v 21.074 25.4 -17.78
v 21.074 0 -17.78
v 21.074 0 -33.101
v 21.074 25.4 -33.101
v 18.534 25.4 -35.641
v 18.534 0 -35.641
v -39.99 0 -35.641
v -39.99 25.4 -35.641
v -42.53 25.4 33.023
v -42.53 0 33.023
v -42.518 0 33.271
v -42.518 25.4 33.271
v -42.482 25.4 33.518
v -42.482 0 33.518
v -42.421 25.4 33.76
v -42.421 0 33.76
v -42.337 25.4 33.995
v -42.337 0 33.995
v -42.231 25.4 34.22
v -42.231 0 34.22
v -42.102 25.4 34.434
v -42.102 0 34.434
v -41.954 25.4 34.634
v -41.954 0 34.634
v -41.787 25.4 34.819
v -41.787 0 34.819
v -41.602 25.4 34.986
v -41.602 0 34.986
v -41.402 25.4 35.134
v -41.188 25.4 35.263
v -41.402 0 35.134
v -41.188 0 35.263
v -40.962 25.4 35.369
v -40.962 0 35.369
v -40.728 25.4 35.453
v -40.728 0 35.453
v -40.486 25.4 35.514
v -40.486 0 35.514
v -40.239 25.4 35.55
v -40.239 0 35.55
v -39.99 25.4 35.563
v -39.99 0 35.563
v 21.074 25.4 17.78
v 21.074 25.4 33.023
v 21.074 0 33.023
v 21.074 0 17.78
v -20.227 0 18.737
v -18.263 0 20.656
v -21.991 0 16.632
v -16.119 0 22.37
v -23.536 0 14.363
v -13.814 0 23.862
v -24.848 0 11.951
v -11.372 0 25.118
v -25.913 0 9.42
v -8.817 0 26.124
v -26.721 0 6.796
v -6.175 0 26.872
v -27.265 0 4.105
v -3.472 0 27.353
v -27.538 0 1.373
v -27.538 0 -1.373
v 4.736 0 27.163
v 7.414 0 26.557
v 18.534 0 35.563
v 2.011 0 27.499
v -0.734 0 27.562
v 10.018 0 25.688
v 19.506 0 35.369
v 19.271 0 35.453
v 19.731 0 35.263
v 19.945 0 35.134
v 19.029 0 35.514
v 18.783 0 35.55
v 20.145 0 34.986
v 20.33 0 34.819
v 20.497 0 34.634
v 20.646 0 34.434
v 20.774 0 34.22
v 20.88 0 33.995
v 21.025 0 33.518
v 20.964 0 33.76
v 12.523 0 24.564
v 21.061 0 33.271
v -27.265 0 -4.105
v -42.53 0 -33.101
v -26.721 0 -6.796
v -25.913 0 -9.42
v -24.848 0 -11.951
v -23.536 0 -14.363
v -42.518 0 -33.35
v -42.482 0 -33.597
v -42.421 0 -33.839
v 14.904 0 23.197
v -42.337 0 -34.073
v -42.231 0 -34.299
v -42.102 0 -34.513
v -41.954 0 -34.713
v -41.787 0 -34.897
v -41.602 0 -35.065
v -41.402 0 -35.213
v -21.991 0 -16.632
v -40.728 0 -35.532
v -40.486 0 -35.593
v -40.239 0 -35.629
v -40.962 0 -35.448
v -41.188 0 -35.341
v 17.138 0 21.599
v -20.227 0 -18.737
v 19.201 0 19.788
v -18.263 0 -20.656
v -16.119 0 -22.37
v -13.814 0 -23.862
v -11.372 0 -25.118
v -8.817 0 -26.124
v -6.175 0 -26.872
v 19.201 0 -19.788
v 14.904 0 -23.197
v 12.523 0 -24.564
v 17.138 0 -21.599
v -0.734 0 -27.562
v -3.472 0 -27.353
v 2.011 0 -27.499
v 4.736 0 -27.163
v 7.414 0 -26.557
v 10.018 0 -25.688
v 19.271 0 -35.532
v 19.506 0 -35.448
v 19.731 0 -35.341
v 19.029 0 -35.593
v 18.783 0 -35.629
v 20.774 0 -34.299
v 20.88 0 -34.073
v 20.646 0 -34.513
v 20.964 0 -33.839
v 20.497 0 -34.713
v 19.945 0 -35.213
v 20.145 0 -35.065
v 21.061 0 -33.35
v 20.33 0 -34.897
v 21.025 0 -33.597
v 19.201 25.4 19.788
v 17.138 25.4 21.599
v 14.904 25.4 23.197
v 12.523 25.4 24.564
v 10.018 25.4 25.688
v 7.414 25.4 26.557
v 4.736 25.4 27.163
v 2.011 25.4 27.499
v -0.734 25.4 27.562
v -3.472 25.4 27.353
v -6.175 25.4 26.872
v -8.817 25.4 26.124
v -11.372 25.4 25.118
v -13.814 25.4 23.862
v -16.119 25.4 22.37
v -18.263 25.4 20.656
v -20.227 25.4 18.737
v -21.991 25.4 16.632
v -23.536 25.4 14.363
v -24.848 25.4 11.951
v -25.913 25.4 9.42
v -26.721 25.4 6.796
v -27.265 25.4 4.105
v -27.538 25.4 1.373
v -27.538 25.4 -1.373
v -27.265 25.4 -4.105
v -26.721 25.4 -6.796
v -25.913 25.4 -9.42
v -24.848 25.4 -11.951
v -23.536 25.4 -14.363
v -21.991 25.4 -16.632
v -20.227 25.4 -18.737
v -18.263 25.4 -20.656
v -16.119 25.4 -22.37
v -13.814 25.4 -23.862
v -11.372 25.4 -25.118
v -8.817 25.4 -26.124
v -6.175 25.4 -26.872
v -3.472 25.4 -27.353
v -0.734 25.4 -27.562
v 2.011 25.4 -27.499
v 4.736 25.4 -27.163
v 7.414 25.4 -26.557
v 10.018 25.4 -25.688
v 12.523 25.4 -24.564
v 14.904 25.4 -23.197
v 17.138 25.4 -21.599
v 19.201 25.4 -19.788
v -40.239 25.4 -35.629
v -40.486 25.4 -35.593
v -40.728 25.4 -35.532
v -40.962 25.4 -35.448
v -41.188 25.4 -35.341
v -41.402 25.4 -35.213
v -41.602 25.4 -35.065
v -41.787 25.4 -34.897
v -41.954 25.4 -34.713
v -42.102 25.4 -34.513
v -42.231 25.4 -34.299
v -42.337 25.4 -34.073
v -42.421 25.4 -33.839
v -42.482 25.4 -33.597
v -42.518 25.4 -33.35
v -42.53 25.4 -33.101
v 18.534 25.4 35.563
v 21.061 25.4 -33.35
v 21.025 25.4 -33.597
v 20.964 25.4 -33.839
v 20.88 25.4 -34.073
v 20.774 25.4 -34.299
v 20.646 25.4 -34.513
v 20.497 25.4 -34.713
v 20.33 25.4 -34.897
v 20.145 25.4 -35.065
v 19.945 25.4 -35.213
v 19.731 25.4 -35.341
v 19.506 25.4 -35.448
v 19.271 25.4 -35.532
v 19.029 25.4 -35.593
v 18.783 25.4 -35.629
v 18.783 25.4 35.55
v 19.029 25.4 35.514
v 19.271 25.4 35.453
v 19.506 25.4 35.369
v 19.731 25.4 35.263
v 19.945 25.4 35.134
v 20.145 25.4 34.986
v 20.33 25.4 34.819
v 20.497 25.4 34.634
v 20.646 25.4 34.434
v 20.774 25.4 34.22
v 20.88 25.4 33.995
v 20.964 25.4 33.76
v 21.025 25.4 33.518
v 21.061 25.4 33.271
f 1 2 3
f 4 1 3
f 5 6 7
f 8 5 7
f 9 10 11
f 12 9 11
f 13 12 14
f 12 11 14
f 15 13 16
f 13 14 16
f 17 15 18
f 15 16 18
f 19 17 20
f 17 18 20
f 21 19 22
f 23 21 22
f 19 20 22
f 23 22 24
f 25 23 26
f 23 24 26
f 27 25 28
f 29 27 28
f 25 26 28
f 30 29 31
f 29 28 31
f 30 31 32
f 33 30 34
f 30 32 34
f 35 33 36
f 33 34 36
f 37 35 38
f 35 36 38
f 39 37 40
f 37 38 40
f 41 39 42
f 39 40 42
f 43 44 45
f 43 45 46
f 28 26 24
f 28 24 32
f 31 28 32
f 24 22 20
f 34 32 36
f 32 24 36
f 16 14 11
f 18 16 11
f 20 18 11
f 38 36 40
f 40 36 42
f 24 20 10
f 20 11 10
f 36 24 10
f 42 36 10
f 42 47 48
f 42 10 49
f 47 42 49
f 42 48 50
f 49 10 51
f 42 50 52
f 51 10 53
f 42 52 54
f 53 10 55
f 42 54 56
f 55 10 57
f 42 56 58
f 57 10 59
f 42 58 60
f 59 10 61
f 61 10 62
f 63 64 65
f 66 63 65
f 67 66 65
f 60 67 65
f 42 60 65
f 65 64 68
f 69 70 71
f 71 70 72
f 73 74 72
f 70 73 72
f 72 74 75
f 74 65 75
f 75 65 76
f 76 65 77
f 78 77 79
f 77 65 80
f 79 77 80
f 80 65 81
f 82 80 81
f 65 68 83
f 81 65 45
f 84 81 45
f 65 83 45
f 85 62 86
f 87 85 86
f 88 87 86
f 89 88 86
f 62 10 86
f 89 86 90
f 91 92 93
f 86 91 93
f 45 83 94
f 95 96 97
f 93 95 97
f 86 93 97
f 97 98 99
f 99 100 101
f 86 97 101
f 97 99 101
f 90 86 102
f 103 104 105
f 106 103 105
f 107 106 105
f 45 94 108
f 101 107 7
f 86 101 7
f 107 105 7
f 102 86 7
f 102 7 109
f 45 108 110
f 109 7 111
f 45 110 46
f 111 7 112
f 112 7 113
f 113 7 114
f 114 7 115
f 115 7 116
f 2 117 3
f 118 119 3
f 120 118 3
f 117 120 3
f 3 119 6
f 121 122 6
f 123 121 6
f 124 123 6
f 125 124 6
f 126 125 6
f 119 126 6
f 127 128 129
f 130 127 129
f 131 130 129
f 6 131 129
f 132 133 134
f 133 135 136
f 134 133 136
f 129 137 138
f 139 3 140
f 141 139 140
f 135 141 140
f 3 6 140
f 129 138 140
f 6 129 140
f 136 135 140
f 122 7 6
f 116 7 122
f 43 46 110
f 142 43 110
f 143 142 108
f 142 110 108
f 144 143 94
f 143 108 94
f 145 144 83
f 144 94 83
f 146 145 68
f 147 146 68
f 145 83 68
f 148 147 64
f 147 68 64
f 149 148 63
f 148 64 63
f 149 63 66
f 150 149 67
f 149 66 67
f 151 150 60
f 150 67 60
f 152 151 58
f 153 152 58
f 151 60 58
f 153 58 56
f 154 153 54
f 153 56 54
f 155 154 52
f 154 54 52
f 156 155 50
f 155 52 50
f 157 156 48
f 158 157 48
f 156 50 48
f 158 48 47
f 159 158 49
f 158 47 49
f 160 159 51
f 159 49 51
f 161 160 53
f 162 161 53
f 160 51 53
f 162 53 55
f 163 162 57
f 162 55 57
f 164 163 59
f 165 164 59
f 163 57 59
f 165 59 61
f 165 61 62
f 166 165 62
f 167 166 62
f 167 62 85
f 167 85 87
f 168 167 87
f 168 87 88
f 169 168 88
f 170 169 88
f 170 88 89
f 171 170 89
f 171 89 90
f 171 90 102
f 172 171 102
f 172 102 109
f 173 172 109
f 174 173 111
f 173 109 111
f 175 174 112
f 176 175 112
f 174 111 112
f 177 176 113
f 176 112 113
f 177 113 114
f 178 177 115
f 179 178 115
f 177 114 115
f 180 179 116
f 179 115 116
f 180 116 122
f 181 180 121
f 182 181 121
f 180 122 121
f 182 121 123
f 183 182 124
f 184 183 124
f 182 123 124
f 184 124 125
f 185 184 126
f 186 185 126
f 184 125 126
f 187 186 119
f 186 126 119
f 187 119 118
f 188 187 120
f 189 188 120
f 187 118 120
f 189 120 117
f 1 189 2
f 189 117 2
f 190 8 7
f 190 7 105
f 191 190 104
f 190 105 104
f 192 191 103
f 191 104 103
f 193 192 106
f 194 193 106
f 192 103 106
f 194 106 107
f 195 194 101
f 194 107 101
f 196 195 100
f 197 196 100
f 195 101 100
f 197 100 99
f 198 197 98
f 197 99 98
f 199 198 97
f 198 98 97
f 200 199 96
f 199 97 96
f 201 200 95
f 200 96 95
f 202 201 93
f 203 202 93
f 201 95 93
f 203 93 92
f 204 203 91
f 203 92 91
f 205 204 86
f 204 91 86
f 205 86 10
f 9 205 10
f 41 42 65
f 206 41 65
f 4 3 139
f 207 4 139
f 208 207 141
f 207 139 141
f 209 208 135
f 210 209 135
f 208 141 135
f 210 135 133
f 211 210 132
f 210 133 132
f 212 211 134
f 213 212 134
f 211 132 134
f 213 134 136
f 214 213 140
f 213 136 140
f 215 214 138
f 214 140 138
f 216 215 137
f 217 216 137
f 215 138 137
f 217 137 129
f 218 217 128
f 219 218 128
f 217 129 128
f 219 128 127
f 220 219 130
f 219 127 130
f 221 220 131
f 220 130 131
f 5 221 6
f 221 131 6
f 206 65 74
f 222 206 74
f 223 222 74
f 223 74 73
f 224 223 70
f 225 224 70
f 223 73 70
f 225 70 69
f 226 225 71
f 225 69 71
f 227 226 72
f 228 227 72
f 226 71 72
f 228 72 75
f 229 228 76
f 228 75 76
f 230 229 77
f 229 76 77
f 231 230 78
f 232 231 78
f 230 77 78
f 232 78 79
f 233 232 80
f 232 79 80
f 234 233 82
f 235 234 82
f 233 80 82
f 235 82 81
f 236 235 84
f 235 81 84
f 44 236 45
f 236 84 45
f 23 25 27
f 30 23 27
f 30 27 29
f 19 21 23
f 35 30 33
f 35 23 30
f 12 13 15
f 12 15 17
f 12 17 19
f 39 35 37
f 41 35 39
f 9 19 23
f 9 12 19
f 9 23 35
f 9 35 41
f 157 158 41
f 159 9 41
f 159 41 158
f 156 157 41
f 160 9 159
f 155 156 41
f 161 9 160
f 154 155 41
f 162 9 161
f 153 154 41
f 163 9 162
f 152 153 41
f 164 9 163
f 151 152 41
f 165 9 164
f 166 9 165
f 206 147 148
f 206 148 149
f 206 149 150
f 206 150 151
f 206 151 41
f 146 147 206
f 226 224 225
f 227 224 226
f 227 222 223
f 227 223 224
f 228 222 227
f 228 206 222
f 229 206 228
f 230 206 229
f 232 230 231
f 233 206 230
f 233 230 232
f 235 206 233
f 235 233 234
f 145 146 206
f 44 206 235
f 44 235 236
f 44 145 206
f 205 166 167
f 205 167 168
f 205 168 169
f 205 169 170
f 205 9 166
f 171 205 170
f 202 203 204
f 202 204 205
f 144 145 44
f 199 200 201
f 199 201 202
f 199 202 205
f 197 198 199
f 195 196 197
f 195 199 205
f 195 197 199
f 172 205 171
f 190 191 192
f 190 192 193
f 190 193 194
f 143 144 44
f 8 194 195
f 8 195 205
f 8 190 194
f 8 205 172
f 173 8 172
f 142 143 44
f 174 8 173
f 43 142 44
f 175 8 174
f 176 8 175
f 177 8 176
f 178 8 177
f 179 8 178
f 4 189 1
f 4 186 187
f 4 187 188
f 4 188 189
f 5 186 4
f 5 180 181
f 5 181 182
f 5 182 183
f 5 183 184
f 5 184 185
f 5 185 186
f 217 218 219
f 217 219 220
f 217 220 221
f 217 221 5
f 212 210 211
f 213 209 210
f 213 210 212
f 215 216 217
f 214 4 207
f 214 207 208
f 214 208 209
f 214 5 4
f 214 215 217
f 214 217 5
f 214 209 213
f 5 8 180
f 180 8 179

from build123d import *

# Parameters (mm, degrees)
BOSS_EXTRUDE1_DEPTH = 25.4


with BuildPart() as part:
    # Sketch1 → Boss-Extrude1 (new body)
    with BuildSketch(Plane(origin=(0, 0, 0), x_dir=(1, 0, 0), z_dir=(0, 1, 0))):
        with BuildLine():
            Line((18.533658611, 35.641367486), (-39.99048208, 35.641367486))
            ThreePointArc((-39.99048208, 35.641367486), (-41.786533304, 34.89741871), (-42.53048208, 33.101367486))
            Line((-42.53048208, 33.101367486), (-42.53048208, -33.022533273))
            ThreePointArc((-42.53048208, -33.022533273), (-41.786533304, -34.818584498), (-39.99048208, -35.562533273))
            Line((-39.99048208, -35.562533273), (18.533658611, -35.562533273))
            ThreePointArc((18.533658611, -35.562533273), (20.329709835, -34.818584498), (21.073658611, -33.022533273))
            Line((21.073658611, -33.022533273), (21.073658611, -17.78))
            ThreePointArc((21.073658611, -17.78), (-27.572223111, 0), (21.073658611, 17.78))
            Line((21.073658611, 17.78), (21.073658611, 33.101367486))
            ThreePointArc((21.073658611, 33.101367486), (20.329709835, 34.89741871), (18.533658611, 35.641367486))
        make_face()
    extrude(amount=BOSS_EXTRUDE1_DEPTH)


solid = part.part
